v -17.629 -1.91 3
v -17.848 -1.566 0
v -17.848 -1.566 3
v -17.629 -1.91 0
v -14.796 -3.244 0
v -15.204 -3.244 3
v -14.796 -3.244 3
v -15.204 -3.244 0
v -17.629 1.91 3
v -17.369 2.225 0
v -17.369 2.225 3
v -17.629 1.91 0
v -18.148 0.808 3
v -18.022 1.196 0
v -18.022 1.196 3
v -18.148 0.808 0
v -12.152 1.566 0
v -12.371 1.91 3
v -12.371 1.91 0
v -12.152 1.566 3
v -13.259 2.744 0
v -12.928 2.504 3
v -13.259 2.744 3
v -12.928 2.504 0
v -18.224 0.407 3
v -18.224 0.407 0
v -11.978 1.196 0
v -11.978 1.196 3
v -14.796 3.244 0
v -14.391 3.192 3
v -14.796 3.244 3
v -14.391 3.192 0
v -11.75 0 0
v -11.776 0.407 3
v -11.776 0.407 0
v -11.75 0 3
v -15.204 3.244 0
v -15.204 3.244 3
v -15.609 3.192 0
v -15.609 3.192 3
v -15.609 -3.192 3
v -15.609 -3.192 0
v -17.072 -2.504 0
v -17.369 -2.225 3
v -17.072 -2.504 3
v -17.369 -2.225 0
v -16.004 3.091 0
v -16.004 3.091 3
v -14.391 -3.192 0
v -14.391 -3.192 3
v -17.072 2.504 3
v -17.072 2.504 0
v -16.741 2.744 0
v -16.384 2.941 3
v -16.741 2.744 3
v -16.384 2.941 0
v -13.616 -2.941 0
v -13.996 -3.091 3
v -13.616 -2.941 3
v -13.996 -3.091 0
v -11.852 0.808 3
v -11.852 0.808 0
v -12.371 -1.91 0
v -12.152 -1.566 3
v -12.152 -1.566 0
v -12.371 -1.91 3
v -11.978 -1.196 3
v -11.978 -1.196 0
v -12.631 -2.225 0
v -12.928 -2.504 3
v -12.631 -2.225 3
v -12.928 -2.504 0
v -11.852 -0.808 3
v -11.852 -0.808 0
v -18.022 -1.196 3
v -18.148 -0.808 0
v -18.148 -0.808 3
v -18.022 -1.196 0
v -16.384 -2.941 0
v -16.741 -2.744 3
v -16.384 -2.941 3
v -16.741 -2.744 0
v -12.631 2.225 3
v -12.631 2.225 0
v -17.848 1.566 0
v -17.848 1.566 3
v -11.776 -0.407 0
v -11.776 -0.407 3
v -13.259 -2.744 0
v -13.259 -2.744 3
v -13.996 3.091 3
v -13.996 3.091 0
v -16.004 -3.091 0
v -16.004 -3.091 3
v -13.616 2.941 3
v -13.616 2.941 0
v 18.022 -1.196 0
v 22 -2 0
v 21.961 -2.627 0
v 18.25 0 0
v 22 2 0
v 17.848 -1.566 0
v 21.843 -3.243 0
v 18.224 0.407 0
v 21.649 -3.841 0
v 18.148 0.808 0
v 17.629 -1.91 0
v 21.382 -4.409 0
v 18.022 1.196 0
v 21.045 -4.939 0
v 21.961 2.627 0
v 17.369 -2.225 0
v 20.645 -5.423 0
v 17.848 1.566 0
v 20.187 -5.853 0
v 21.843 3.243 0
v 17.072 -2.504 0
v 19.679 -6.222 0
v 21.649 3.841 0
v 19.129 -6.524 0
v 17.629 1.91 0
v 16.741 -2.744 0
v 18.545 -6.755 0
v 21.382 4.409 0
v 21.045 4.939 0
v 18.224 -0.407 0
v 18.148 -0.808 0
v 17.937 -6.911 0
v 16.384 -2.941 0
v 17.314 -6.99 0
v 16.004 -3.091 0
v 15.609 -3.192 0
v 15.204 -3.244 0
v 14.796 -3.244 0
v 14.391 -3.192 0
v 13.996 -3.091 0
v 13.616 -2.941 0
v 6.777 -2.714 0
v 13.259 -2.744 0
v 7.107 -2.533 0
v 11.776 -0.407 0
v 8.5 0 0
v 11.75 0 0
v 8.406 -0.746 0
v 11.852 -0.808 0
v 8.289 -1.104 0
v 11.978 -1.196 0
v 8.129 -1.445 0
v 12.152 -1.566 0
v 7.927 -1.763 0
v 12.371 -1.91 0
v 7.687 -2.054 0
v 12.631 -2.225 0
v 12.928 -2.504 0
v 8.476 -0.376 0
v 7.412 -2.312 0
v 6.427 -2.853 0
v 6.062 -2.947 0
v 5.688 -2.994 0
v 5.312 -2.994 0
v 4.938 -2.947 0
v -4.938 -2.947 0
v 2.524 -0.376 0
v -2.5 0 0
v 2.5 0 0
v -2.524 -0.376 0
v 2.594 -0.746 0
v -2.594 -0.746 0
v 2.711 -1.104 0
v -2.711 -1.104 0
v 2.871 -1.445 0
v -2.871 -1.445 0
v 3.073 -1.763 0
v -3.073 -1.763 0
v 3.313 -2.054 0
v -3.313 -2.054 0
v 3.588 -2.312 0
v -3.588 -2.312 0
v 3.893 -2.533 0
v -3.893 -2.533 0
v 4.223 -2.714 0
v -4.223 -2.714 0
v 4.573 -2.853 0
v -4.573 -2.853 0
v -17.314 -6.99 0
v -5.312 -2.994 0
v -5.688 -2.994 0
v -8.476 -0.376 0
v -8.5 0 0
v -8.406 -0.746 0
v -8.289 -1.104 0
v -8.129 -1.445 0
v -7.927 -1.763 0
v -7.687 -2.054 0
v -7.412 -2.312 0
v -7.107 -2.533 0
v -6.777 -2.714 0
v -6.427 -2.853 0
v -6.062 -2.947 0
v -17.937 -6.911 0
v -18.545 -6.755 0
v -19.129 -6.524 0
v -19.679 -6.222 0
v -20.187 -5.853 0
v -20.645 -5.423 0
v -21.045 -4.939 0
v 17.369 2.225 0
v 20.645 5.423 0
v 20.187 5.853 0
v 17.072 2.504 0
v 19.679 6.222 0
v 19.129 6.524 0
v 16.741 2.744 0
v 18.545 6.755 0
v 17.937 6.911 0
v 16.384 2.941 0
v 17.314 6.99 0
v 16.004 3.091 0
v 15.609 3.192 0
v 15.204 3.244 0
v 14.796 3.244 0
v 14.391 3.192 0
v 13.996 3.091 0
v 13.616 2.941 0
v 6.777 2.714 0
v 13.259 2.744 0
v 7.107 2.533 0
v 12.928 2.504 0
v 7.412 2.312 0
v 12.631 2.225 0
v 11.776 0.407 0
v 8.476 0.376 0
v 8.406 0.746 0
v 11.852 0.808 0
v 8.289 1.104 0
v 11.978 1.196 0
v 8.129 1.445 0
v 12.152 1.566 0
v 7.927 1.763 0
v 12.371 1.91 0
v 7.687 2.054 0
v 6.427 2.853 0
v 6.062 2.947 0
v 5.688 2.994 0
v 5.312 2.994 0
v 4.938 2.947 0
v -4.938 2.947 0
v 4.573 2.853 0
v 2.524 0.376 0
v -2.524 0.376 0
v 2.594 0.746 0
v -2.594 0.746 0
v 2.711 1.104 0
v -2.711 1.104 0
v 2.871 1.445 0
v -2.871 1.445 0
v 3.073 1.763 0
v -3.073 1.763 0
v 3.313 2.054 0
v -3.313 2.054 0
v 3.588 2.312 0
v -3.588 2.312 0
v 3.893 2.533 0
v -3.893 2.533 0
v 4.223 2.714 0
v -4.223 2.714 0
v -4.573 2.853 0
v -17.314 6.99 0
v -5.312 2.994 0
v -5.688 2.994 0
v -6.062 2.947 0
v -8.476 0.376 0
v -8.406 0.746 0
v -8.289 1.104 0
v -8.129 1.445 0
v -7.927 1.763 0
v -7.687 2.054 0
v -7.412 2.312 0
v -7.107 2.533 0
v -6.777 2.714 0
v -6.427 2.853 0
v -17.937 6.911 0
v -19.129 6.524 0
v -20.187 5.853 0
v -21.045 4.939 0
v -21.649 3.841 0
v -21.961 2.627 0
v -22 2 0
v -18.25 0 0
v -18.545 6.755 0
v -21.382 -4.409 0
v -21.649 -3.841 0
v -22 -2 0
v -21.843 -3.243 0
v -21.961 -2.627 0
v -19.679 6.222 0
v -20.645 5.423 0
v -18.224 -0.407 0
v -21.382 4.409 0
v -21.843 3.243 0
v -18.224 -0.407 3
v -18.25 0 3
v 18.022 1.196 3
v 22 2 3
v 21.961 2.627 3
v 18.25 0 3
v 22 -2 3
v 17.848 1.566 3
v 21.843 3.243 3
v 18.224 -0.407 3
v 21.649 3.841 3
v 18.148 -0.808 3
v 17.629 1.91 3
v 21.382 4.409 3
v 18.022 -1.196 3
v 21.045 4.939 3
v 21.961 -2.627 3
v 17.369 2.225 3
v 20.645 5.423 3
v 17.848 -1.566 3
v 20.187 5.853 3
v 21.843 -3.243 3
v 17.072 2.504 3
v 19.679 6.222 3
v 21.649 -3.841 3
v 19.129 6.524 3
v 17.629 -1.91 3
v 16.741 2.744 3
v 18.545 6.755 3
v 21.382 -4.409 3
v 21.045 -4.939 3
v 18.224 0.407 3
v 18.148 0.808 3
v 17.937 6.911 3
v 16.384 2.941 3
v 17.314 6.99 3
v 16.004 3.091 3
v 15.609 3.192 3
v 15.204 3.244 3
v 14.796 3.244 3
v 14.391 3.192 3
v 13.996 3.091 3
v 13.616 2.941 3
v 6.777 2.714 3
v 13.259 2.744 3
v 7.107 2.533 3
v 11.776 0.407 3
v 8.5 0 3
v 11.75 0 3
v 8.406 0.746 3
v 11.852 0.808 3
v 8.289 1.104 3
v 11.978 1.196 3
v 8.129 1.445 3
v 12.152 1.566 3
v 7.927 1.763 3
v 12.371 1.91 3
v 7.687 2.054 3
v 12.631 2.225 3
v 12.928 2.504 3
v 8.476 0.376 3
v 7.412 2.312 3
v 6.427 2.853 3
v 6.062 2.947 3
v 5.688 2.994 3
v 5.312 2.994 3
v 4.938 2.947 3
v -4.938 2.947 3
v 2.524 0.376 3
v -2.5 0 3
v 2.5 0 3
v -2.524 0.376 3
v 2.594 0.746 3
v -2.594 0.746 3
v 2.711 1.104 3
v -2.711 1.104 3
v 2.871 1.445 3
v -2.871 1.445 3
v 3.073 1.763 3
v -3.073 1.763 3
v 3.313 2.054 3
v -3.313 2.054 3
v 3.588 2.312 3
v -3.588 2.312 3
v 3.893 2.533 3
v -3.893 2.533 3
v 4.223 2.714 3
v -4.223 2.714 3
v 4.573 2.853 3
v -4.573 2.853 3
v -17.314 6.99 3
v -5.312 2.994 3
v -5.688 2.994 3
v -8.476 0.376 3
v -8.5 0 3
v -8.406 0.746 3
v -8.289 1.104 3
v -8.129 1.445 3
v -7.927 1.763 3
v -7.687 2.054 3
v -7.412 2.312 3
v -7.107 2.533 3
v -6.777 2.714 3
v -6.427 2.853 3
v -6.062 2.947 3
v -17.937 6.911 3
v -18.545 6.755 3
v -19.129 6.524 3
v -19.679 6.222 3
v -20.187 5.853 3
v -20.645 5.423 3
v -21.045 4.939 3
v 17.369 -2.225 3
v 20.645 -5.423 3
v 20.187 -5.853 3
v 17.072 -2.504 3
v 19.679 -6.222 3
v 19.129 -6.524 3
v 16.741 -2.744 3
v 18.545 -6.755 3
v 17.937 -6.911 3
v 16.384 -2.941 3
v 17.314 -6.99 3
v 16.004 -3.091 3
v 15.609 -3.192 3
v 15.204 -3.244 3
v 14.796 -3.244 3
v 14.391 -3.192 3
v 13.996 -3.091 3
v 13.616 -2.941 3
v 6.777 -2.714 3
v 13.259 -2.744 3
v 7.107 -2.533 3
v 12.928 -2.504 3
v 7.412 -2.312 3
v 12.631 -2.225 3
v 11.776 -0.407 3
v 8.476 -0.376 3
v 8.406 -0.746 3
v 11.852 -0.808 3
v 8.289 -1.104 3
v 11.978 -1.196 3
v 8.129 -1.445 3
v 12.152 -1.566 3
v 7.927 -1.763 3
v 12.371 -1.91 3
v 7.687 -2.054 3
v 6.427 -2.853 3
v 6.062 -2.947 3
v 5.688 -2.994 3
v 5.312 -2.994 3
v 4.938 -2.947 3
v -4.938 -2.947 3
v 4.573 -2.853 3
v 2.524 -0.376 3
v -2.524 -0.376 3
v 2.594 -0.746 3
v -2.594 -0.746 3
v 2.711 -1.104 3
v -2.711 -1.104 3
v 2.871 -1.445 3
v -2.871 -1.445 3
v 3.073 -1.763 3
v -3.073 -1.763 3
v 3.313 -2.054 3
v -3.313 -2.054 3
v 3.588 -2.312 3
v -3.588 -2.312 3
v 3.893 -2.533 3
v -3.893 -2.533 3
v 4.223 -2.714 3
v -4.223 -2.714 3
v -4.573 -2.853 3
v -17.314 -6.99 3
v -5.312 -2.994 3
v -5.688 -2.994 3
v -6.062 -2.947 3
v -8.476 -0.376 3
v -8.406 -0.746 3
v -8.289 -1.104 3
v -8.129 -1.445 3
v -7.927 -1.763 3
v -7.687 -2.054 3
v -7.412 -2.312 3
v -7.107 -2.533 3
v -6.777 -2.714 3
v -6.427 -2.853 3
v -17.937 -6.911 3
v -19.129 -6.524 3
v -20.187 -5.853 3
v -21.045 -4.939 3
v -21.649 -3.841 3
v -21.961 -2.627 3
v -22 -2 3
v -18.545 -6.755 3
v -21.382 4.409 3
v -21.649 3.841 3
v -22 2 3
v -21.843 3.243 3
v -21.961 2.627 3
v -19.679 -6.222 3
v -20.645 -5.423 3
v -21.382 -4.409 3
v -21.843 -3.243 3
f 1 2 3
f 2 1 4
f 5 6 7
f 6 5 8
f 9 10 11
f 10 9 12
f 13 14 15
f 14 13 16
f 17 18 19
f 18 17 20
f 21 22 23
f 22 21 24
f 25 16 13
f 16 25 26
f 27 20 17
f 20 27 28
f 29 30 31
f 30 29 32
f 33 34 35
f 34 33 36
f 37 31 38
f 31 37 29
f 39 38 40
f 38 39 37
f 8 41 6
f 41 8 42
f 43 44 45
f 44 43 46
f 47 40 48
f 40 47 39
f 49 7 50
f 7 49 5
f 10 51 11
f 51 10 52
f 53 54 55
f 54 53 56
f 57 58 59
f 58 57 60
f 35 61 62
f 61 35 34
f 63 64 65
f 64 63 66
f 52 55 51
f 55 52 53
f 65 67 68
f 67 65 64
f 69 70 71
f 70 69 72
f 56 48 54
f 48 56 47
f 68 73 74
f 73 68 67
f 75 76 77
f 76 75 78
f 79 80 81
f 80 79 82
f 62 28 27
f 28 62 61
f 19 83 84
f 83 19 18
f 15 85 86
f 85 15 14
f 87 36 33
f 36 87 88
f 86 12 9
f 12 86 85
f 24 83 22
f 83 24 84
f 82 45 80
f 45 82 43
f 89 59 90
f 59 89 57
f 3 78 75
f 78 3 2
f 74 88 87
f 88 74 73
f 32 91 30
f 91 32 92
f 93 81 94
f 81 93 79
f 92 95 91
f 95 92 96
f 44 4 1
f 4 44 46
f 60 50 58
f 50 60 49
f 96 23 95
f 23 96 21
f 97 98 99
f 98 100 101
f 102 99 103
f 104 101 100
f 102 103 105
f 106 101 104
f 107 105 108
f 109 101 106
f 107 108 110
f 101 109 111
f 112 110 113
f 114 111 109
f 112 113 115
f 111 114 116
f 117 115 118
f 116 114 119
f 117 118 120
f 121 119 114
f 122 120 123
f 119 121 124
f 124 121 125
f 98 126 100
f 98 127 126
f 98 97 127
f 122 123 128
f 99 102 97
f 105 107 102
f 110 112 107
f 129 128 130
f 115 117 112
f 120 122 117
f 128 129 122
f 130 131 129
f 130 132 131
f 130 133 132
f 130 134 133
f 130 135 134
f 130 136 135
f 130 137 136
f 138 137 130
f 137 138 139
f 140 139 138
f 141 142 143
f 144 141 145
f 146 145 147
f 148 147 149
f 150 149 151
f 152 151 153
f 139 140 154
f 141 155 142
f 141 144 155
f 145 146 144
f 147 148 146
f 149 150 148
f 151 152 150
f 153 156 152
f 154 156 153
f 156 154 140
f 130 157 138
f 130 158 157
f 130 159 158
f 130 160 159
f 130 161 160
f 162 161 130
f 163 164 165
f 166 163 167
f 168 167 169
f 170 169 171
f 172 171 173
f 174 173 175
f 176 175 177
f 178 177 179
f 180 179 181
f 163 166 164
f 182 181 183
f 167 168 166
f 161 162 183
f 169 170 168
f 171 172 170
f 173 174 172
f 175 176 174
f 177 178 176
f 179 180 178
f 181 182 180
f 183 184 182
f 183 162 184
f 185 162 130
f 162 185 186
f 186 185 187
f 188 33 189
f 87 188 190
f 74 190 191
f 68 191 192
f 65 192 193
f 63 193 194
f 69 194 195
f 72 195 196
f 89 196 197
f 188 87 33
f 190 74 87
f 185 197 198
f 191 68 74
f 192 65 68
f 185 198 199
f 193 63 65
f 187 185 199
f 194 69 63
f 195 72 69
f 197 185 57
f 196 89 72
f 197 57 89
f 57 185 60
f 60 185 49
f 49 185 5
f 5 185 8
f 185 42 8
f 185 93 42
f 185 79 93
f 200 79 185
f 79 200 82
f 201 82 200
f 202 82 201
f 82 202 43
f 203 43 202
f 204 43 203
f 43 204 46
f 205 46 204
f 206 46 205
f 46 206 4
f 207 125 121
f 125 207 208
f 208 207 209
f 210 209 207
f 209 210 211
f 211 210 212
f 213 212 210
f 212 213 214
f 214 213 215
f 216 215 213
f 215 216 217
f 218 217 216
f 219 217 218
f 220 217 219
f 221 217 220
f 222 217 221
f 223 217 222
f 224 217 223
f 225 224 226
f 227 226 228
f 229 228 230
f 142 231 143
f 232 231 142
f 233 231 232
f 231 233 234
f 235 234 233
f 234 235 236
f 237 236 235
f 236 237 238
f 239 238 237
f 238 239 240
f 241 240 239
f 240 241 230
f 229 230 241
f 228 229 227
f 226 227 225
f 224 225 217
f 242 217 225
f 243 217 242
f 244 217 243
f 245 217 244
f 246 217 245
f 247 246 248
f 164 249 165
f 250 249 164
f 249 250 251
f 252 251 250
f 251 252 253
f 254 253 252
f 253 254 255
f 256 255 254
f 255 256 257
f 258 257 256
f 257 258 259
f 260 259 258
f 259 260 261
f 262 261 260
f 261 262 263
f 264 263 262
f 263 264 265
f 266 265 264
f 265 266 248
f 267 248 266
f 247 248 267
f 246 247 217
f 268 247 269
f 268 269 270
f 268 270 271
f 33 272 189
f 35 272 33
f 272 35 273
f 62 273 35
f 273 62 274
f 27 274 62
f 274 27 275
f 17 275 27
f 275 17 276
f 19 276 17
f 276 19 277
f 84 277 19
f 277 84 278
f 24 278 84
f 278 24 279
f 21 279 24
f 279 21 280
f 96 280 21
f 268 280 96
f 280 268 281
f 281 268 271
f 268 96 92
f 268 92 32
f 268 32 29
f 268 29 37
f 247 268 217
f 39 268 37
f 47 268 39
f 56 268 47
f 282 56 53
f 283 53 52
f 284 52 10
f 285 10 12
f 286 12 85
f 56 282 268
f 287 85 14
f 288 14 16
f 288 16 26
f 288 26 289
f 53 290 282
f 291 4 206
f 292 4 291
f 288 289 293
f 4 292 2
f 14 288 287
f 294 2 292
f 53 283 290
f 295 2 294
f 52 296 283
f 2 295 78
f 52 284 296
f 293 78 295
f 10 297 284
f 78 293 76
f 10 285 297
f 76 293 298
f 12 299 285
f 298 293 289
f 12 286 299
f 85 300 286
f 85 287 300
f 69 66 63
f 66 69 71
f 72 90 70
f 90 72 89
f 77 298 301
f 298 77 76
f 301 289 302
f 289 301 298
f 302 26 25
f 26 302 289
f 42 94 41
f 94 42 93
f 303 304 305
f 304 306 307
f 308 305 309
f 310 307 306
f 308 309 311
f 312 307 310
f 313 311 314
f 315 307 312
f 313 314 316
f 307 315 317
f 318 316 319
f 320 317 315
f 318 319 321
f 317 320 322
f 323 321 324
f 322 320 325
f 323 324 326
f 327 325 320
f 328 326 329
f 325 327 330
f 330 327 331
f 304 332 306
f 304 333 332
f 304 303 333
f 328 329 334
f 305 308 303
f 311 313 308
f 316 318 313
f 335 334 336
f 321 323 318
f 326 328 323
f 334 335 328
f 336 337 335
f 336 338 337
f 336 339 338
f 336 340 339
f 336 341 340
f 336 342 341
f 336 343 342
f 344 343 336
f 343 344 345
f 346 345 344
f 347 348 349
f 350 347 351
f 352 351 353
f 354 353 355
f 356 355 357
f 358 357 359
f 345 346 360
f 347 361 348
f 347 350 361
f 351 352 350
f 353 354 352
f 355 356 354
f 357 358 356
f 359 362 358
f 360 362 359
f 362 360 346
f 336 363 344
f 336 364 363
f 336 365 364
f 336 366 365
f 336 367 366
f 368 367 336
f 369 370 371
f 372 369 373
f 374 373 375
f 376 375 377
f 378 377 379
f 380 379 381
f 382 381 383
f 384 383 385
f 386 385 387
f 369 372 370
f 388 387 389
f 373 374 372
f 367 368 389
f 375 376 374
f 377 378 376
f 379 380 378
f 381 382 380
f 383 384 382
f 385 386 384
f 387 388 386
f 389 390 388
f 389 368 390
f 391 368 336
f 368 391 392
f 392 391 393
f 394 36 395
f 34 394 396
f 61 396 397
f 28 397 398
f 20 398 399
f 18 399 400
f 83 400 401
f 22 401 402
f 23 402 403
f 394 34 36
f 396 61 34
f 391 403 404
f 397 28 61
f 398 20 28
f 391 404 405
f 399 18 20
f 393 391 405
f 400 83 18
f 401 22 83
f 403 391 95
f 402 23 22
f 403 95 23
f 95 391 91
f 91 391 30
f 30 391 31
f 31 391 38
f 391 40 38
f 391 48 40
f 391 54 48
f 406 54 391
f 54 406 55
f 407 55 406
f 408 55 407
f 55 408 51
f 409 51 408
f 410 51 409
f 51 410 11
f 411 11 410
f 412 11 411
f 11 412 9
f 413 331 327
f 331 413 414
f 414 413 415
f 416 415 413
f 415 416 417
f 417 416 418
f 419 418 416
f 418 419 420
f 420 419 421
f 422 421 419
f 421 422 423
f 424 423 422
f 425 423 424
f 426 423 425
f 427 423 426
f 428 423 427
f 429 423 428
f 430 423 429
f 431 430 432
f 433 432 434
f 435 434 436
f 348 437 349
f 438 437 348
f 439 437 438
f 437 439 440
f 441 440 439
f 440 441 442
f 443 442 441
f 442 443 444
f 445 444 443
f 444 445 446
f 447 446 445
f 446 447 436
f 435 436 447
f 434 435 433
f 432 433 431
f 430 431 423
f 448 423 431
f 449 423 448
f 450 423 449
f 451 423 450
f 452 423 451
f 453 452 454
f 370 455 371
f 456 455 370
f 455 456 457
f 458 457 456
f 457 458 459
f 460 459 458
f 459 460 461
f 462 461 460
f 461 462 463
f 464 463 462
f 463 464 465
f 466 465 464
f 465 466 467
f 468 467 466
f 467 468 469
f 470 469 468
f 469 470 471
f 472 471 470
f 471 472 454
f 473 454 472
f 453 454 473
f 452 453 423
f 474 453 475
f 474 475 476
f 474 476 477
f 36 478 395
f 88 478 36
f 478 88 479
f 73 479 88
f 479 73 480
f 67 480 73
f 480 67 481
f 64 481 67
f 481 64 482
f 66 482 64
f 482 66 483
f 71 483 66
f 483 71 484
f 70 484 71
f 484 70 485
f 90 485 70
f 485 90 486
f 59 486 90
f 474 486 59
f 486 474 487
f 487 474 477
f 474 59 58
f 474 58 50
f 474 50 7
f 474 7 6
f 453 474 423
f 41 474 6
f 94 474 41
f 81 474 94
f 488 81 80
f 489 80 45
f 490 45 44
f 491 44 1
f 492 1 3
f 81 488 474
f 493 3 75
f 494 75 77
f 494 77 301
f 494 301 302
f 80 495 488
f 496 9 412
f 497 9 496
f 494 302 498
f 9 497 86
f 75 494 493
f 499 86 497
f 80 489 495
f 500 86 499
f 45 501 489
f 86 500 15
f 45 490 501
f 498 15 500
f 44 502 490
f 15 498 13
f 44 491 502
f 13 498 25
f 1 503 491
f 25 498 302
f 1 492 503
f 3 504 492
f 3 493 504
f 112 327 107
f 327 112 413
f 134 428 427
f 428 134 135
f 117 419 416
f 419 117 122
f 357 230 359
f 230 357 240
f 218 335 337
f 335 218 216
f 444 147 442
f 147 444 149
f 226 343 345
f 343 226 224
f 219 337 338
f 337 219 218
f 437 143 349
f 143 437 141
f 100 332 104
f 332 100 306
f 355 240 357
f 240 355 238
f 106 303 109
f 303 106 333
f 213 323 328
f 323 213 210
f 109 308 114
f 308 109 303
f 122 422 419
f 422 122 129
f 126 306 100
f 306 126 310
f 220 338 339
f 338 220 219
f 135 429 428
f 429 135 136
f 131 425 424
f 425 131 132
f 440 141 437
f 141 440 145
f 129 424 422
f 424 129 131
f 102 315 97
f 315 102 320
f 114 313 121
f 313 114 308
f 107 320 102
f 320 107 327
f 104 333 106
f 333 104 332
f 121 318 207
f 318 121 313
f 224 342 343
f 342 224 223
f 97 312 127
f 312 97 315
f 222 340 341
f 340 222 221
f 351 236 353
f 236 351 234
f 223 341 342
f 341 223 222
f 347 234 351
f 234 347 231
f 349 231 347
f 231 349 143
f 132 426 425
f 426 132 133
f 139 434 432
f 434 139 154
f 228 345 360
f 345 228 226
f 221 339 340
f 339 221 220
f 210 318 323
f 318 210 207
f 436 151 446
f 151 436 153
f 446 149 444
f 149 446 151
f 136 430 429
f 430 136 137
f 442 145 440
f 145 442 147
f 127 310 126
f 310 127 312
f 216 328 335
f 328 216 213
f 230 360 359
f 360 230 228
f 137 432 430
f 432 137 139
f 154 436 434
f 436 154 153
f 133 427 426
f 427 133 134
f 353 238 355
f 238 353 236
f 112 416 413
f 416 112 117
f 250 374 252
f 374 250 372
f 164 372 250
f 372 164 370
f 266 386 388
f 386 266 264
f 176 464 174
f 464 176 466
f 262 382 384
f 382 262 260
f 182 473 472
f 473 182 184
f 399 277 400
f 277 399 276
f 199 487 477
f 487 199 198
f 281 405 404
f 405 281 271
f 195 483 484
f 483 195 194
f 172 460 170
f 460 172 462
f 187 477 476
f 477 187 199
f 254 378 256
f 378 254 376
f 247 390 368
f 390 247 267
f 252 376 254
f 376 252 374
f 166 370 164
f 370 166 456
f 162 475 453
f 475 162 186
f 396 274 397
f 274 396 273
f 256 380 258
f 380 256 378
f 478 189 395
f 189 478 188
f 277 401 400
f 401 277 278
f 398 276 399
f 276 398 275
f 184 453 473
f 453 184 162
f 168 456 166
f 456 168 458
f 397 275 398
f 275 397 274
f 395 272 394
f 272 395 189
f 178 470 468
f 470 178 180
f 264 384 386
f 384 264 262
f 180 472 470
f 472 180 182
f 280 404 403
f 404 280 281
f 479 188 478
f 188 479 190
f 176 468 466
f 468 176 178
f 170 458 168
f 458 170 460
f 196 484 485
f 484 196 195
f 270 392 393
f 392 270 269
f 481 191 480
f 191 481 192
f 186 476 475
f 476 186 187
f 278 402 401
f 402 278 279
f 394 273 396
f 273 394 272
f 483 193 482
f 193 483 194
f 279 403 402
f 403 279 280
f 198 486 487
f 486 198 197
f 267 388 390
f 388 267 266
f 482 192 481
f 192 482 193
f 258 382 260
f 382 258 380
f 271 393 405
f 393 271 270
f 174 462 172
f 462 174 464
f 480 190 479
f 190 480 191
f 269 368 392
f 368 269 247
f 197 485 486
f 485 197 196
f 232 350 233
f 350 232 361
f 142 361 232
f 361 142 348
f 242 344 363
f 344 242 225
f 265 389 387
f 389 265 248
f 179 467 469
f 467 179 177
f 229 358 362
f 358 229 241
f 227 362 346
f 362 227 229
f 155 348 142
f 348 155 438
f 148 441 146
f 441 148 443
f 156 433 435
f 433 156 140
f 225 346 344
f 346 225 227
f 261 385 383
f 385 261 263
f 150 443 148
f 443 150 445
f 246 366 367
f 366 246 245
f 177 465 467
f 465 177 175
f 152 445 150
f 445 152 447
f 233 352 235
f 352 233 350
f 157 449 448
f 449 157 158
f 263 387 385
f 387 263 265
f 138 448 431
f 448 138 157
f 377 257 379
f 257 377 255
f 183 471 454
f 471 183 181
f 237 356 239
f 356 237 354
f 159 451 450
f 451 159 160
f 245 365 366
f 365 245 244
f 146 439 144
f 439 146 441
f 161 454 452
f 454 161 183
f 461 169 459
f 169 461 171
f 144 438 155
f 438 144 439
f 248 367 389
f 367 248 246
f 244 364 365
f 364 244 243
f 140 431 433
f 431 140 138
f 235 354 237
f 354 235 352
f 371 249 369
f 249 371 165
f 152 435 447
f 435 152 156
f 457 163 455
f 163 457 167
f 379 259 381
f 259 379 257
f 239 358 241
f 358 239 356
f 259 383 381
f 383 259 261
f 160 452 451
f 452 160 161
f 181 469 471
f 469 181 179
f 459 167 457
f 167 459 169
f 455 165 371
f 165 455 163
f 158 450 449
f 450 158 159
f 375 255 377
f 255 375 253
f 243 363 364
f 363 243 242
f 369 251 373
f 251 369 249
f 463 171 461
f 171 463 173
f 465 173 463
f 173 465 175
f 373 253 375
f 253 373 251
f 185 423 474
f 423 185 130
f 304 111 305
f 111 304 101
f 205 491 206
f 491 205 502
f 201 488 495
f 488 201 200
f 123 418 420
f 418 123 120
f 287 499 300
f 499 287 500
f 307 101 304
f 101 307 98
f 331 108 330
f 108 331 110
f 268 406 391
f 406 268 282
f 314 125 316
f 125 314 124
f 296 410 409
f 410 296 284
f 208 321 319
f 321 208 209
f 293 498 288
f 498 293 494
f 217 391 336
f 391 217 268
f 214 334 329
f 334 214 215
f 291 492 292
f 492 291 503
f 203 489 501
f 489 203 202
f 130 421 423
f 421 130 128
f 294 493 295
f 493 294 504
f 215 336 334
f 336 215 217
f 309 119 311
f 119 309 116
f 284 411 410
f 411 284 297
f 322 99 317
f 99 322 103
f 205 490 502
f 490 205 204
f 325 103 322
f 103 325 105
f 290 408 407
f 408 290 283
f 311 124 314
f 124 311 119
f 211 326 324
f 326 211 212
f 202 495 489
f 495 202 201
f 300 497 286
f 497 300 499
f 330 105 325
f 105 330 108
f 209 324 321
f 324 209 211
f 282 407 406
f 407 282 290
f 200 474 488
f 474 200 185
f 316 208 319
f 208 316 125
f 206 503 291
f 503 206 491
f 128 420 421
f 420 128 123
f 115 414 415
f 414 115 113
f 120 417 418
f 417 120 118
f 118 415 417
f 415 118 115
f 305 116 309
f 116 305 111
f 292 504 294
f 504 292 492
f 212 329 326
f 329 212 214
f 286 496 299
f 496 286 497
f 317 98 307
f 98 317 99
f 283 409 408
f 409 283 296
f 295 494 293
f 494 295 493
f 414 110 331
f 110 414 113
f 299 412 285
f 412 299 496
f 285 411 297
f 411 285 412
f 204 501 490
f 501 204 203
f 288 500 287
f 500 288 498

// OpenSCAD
$fn = 50;

difference() {
	union() {
		hull() {
			translate(v = [-17.0, 2.0, 0]) {
				cylinder(h = 3, r = 5);
			}
			translate(v = [17.0, 2.0, 0]) {
				cylinder(h = 3, r = 5);
			}
			translate(v = [-17.0, -2.0, 0]) {
				cylinder(h = 3, r = 5);
			}
			translate(v = [17.0, -2.0, 0]) {
				cylinder(h = 3, r = 5);
			}
		}
	}
	union() {
		translate(v = [-15.0, 0.0, 0]) {
			cylinder(h = 3, r = 3.25);
		}
		translate(v = [15.0, 0.0, 0]) {
			cylinder(h = 3, r = 3.25);
		}
		translate(v = [-5.5, 0, 0.0]) {
			cylinder(h = 3, r = 3.0);
		}
		translate(v = [5.5, 0, 0.0]) {
			cylinder(h = 3, r = 3.0);
		}
	}
}
